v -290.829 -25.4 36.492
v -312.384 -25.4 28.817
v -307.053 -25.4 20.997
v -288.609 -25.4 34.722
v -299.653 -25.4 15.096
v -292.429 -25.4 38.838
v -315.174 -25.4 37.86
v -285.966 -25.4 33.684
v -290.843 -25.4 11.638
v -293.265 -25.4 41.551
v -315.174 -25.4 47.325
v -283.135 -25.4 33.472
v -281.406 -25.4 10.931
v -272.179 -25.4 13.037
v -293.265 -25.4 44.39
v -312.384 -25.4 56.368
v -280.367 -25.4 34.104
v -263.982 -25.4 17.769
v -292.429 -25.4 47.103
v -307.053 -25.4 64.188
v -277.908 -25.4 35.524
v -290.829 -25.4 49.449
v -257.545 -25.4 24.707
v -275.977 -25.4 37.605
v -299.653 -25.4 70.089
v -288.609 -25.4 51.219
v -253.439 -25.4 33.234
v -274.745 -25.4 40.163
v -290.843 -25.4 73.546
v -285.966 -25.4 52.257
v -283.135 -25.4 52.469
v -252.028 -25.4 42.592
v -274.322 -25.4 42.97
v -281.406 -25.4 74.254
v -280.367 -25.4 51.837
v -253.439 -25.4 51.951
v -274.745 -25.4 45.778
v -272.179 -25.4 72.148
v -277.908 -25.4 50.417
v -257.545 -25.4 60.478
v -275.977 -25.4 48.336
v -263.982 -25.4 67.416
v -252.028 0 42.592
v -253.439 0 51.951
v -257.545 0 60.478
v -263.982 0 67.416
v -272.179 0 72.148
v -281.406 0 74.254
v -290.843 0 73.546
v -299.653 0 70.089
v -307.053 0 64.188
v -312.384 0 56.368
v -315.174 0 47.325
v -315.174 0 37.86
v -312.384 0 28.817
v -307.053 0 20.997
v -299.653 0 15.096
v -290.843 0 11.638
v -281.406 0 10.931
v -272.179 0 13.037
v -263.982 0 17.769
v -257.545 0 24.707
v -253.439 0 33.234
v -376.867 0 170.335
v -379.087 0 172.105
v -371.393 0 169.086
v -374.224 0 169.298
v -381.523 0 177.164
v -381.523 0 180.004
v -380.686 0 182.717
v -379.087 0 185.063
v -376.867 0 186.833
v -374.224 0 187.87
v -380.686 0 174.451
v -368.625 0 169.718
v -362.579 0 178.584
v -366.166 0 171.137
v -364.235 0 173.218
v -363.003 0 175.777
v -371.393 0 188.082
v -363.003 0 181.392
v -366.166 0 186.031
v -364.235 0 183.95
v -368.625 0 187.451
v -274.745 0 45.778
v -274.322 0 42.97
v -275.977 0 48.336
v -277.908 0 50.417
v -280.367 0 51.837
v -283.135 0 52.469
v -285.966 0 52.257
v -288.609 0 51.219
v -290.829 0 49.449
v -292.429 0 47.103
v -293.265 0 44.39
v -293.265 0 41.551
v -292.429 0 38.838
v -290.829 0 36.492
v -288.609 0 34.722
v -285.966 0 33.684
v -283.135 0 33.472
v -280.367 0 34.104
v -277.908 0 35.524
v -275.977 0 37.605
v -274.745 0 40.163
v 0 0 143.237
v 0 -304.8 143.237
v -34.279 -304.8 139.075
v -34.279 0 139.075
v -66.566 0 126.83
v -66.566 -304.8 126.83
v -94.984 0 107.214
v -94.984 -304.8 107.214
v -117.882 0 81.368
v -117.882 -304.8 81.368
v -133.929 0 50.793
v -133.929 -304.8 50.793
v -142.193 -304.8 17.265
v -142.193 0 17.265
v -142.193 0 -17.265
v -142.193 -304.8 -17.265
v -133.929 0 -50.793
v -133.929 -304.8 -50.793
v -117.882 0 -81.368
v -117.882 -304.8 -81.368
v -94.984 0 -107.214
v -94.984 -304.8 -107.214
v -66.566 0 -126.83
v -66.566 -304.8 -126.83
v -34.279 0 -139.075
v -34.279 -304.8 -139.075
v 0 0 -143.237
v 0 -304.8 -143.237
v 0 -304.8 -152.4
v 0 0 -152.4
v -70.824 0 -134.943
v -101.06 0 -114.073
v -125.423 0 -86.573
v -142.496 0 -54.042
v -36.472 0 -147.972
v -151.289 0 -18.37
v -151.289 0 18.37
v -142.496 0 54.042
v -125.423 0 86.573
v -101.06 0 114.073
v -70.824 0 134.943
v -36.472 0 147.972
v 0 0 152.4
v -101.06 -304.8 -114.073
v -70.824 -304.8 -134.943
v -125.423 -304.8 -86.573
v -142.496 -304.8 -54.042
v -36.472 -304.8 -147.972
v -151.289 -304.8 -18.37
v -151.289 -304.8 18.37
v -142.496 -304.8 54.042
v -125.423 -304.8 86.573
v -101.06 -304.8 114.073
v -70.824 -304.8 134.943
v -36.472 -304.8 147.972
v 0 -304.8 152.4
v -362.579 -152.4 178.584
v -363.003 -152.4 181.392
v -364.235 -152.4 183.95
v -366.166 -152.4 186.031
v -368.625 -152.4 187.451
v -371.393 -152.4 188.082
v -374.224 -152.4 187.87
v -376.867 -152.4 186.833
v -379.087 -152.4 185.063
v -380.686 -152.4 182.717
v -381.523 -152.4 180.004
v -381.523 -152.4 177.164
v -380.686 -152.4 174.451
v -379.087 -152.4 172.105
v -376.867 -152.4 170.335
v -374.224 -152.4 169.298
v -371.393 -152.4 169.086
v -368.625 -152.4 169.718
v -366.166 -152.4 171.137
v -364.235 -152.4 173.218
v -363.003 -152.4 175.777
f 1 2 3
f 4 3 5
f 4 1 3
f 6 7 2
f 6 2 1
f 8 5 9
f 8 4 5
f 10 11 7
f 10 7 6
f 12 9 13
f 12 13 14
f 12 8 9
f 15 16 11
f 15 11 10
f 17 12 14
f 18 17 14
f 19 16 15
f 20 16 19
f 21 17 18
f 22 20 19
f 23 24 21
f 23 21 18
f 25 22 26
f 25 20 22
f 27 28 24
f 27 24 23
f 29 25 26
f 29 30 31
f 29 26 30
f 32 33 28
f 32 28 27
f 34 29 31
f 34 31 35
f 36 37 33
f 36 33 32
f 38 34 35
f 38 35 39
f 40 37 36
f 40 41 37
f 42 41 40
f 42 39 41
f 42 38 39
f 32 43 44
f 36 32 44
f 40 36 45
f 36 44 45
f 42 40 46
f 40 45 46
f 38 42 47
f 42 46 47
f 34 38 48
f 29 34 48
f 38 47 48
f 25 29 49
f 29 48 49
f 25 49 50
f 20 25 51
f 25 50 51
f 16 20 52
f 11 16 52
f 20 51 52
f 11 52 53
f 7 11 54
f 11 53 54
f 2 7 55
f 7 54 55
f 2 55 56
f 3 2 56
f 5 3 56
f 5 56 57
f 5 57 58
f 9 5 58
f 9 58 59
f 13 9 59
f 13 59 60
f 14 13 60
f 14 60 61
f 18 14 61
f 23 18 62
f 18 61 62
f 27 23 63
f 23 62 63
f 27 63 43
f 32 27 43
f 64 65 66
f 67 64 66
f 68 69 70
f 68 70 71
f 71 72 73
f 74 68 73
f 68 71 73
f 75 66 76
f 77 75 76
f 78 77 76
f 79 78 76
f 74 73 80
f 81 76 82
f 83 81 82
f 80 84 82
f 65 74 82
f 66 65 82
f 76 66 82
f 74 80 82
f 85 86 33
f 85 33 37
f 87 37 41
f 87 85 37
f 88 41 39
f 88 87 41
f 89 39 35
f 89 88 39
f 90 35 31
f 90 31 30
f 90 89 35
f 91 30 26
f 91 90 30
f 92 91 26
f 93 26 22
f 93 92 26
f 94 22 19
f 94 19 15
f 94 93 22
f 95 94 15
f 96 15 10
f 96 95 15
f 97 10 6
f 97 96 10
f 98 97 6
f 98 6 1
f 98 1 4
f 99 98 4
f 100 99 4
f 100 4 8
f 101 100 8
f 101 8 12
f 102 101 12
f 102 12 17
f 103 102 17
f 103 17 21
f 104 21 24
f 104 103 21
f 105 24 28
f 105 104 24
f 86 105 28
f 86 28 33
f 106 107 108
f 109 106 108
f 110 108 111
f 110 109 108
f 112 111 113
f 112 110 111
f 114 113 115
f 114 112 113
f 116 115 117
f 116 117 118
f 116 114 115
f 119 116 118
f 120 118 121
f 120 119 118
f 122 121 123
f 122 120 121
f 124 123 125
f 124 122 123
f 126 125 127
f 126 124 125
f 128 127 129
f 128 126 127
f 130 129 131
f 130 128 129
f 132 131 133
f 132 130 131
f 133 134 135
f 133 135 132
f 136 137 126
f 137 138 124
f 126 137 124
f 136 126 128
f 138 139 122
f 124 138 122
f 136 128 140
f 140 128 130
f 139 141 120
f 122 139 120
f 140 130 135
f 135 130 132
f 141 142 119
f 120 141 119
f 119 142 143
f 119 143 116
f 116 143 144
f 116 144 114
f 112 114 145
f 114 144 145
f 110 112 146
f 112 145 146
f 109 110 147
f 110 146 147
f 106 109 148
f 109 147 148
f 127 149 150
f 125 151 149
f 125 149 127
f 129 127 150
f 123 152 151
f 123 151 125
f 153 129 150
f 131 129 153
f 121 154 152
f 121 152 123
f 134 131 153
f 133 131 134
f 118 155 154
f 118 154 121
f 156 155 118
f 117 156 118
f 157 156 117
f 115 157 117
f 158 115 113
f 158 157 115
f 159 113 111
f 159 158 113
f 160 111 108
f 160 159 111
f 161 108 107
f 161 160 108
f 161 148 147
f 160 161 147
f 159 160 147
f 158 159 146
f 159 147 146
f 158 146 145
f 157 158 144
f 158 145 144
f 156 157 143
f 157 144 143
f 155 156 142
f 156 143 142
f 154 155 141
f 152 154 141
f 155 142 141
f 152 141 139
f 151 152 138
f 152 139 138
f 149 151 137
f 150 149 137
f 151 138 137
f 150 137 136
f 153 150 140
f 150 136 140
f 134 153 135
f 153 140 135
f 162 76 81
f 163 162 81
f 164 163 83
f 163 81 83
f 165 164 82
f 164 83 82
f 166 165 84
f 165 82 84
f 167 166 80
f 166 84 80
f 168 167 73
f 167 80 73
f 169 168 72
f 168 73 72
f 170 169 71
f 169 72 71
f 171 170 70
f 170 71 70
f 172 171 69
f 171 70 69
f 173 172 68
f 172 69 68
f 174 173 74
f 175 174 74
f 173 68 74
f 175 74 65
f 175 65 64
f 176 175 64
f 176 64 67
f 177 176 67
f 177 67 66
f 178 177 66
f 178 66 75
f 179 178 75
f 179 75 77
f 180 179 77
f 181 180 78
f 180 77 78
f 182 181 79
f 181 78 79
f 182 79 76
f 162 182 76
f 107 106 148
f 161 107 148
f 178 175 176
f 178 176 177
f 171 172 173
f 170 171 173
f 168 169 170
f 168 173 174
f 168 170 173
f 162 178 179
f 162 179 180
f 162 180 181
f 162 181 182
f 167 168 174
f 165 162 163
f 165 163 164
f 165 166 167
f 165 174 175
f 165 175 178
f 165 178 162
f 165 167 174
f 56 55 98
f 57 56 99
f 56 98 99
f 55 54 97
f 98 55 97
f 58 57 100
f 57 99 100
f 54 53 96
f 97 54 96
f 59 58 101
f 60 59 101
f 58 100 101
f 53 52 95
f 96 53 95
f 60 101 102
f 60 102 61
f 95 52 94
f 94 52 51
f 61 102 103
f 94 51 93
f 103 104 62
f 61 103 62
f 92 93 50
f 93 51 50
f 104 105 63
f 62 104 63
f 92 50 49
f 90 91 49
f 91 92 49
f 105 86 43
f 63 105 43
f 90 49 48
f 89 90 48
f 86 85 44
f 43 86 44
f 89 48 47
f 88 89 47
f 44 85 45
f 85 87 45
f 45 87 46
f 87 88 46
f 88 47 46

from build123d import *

# Parameters (mm, degrees)
F1_DEPTH = 304.8
F2_R     = 143.236944
F3_DEPTH = 304.8
F4_R     = 9.525
F5_DEPTH = 152.4
F6_R     = 31.75
F7_DEPTH = 25.4
F8_R     = 9.525
F9_DEPTH = 25.4


with BuildPart() as f1:
    # F0 (on Front) → F1 (new body)
    with BuildSketch(Plane.XZ):
        with BuildLine():
            Line((0, -152.4), (0, 152.4))
            ThreePointArc((0, 152.4), (-152.4, 0), (0, -152.4))
        make_face()
    extrude(amount=F1_DEPTH)

    # F2 (on Front) → F3 (cut)
    with BuildSketch(Plane.XZ):
        Circle(F2_R)
    extrude(amount=F3_DEPTH, mode=Mode.SUBTRACT)


with BuildPart() as f5:
    # F4 (on Front) → F5 (new body)
    with BuildSketch(Plane.XZ):
        with Locations((-372.104466, 178.584084)):
            Circle(F4_R)
    extrude(amount=F5_DEPTH)


with BuildPart() as f7:
    # F6 (on Front) → F7 (new body)
    with BuildSketch(Plane.XZ):
        with Locations((-283.77825, 42.592432)):
            Circle(F6_R)
    extrude(amount=F7_DEPTH)

    # F8 (on Front) → F9 (cut)
    with BuildSketch(Plane.XZ):
        with Locations((-283.846796, 42.970479)):
            Circle(F8_R)
    extrude(amount=F9_DEPTH, mode=Mode.SUBTRACT)


solid = Compound([f1.part, f5.part, f7.part])
